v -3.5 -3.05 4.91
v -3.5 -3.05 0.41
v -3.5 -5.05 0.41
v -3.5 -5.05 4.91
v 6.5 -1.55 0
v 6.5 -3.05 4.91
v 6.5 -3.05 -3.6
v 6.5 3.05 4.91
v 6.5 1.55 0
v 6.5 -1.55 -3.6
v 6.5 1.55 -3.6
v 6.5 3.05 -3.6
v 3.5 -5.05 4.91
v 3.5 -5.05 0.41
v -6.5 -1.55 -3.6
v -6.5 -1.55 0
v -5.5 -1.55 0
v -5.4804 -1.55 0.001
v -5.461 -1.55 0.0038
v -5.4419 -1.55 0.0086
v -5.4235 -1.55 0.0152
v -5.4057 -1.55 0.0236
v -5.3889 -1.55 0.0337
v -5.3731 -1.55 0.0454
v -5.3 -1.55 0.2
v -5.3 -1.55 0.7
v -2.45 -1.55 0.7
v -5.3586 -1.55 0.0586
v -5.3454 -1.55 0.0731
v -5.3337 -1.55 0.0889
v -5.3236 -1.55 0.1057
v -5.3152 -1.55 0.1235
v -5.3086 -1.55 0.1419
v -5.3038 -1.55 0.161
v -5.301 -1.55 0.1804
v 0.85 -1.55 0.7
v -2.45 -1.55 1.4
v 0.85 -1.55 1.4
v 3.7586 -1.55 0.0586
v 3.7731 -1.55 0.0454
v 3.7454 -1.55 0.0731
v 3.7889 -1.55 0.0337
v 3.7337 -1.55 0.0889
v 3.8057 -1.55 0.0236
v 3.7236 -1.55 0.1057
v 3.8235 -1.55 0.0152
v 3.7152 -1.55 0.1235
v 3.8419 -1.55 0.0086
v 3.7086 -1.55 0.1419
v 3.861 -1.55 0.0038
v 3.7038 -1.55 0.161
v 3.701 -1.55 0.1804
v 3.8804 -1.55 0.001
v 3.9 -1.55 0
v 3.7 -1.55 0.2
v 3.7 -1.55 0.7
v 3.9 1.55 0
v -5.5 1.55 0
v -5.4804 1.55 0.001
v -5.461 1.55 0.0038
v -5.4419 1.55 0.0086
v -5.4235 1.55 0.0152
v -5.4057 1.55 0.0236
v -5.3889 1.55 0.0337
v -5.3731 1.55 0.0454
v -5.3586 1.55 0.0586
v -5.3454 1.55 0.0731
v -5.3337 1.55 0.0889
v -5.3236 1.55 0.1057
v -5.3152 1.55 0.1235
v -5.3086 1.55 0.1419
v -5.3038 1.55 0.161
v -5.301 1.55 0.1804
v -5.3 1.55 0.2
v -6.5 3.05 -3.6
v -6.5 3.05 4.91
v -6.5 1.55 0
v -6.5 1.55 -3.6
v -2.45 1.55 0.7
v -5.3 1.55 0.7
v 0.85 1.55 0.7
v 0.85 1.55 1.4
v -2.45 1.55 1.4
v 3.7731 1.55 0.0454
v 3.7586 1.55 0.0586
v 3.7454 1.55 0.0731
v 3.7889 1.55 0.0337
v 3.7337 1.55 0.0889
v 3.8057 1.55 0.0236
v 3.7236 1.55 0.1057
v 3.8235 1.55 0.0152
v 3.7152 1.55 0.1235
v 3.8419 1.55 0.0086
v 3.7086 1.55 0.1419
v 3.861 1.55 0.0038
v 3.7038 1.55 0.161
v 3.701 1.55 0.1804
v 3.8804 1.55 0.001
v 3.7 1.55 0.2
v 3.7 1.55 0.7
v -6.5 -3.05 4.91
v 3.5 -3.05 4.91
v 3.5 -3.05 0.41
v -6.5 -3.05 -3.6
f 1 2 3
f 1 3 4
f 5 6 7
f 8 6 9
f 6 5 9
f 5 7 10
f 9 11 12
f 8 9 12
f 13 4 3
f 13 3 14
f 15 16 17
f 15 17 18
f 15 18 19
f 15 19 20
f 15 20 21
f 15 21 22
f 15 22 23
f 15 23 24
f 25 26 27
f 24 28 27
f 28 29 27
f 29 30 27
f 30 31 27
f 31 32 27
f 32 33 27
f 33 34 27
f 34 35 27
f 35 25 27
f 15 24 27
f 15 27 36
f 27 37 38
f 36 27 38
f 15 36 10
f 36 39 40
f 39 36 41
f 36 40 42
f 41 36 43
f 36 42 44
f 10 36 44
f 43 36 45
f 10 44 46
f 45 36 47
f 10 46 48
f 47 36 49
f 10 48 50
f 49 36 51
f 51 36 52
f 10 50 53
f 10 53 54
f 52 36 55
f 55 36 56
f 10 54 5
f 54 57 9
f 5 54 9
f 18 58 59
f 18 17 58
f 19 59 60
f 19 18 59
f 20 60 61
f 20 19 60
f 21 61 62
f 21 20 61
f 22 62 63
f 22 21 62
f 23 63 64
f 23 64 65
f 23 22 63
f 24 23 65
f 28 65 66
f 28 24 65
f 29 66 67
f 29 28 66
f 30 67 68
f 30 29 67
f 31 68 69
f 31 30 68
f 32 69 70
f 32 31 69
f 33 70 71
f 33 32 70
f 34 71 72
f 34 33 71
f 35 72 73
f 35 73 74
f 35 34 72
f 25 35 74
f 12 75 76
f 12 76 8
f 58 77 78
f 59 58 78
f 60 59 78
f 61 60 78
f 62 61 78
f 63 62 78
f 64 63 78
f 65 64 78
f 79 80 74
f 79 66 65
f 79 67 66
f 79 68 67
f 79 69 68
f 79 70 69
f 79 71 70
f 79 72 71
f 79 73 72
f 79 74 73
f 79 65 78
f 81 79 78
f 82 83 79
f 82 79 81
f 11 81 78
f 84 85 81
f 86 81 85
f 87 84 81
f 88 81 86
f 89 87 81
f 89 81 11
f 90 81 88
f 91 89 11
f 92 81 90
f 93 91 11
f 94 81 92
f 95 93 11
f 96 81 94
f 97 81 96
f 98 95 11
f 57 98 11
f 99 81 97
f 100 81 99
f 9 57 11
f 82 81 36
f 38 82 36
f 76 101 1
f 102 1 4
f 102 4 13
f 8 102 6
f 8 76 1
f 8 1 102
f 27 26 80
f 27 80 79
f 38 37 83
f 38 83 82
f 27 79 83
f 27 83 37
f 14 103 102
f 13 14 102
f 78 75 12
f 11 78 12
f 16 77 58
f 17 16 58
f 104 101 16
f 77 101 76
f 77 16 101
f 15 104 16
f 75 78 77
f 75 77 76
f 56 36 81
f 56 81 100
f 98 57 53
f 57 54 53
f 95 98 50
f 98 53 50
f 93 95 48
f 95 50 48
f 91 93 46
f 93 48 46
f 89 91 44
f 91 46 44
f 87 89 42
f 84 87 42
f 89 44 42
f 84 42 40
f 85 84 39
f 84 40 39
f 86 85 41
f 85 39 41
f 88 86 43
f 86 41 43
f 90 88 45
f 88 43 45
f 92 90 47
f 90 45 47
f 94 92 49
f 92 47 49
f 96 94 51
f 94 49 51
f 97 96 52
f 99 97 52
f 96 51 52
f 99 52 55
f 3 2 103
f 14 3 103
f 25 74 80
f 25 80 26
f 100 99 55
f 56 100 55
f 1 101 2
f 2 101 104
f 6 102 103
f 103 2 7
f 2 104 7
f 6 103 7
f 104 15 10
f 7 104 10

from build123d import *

# Parameters (mm, degrees)
F0_W     = 13
F0_H     = 1.5
F1_DEPTH = 3.6
F2_W     = 13
F2_H     = 6.1
F3_DEPTH = 4.91
F4_W     = 9
F4_H     = 3.1
F5_DEPTH = 0.7
F6_W     = 3.3
F6_H     = 3.1
F7_DEPTH = 0.7
F8_W     = 7
F8_H     = 4.5
F9_DEPTH = 2
F10_R    = 0.2


with BuildPart() as f1:
    # F0 (on Top) → F1 (new body)
    with BuildSketch(Plane.XY):
        with Locations((0, 2.3)):
            Rectangle(F0_W, F0_H)
        with Locations((0, -2.3)):
            Rectangle(F0_W, F0_H)
    extrude(amount=-F1_DEPTH)

    # F2 (on Top) → F3 (join)
    with BuildSketch(Plane.XY):
        Rectangle(F2_W, F2_H)
    extrude(amount=F3_DEPTH)

    # F4 (on face) → F5 (cut)
    with BuildSketch(Plane(origin=(0, 0, 0), x_dir=(1, 0, 0), z_dir=(0, 0, -1))):
        with Locations((-0.8, 0)):
            Rectangle(F4_W, F4_H)
    extrude(amount=-F5_DEPTH, mode=Mode.SUBTRACT)

    # F6 (on face) → F7 (cut)
    with BuildSketch(Plane(origin=(0, 0, 0.7), x_dir=(1, 0, 0), z_dir=(0, 0, -1))):
        with Locations((-0.8, 0)):
            Rectangle(F6_W, F6_H)
    extrude(amount=-F7_DEPTH, mode=Mode.SUBTRACT)

    # F8 (on face) → F9 (join)
    with BuildSketch(Plane.XZ.offset(3.05)):
        with Locations((0, 2.66)):
            Rectangle(F8_W, F8_H)
    extrude(amount=F9_DEPTH)

    # F10
    f10_edges = [f1.edges().sort_by_distance(p)[0] for p in [
        (-5.3, 0, 0),
        (3.7, 0, 0),
    ]]
    fillet(f10_edges, radius=F10_R)


solid = f1.part
